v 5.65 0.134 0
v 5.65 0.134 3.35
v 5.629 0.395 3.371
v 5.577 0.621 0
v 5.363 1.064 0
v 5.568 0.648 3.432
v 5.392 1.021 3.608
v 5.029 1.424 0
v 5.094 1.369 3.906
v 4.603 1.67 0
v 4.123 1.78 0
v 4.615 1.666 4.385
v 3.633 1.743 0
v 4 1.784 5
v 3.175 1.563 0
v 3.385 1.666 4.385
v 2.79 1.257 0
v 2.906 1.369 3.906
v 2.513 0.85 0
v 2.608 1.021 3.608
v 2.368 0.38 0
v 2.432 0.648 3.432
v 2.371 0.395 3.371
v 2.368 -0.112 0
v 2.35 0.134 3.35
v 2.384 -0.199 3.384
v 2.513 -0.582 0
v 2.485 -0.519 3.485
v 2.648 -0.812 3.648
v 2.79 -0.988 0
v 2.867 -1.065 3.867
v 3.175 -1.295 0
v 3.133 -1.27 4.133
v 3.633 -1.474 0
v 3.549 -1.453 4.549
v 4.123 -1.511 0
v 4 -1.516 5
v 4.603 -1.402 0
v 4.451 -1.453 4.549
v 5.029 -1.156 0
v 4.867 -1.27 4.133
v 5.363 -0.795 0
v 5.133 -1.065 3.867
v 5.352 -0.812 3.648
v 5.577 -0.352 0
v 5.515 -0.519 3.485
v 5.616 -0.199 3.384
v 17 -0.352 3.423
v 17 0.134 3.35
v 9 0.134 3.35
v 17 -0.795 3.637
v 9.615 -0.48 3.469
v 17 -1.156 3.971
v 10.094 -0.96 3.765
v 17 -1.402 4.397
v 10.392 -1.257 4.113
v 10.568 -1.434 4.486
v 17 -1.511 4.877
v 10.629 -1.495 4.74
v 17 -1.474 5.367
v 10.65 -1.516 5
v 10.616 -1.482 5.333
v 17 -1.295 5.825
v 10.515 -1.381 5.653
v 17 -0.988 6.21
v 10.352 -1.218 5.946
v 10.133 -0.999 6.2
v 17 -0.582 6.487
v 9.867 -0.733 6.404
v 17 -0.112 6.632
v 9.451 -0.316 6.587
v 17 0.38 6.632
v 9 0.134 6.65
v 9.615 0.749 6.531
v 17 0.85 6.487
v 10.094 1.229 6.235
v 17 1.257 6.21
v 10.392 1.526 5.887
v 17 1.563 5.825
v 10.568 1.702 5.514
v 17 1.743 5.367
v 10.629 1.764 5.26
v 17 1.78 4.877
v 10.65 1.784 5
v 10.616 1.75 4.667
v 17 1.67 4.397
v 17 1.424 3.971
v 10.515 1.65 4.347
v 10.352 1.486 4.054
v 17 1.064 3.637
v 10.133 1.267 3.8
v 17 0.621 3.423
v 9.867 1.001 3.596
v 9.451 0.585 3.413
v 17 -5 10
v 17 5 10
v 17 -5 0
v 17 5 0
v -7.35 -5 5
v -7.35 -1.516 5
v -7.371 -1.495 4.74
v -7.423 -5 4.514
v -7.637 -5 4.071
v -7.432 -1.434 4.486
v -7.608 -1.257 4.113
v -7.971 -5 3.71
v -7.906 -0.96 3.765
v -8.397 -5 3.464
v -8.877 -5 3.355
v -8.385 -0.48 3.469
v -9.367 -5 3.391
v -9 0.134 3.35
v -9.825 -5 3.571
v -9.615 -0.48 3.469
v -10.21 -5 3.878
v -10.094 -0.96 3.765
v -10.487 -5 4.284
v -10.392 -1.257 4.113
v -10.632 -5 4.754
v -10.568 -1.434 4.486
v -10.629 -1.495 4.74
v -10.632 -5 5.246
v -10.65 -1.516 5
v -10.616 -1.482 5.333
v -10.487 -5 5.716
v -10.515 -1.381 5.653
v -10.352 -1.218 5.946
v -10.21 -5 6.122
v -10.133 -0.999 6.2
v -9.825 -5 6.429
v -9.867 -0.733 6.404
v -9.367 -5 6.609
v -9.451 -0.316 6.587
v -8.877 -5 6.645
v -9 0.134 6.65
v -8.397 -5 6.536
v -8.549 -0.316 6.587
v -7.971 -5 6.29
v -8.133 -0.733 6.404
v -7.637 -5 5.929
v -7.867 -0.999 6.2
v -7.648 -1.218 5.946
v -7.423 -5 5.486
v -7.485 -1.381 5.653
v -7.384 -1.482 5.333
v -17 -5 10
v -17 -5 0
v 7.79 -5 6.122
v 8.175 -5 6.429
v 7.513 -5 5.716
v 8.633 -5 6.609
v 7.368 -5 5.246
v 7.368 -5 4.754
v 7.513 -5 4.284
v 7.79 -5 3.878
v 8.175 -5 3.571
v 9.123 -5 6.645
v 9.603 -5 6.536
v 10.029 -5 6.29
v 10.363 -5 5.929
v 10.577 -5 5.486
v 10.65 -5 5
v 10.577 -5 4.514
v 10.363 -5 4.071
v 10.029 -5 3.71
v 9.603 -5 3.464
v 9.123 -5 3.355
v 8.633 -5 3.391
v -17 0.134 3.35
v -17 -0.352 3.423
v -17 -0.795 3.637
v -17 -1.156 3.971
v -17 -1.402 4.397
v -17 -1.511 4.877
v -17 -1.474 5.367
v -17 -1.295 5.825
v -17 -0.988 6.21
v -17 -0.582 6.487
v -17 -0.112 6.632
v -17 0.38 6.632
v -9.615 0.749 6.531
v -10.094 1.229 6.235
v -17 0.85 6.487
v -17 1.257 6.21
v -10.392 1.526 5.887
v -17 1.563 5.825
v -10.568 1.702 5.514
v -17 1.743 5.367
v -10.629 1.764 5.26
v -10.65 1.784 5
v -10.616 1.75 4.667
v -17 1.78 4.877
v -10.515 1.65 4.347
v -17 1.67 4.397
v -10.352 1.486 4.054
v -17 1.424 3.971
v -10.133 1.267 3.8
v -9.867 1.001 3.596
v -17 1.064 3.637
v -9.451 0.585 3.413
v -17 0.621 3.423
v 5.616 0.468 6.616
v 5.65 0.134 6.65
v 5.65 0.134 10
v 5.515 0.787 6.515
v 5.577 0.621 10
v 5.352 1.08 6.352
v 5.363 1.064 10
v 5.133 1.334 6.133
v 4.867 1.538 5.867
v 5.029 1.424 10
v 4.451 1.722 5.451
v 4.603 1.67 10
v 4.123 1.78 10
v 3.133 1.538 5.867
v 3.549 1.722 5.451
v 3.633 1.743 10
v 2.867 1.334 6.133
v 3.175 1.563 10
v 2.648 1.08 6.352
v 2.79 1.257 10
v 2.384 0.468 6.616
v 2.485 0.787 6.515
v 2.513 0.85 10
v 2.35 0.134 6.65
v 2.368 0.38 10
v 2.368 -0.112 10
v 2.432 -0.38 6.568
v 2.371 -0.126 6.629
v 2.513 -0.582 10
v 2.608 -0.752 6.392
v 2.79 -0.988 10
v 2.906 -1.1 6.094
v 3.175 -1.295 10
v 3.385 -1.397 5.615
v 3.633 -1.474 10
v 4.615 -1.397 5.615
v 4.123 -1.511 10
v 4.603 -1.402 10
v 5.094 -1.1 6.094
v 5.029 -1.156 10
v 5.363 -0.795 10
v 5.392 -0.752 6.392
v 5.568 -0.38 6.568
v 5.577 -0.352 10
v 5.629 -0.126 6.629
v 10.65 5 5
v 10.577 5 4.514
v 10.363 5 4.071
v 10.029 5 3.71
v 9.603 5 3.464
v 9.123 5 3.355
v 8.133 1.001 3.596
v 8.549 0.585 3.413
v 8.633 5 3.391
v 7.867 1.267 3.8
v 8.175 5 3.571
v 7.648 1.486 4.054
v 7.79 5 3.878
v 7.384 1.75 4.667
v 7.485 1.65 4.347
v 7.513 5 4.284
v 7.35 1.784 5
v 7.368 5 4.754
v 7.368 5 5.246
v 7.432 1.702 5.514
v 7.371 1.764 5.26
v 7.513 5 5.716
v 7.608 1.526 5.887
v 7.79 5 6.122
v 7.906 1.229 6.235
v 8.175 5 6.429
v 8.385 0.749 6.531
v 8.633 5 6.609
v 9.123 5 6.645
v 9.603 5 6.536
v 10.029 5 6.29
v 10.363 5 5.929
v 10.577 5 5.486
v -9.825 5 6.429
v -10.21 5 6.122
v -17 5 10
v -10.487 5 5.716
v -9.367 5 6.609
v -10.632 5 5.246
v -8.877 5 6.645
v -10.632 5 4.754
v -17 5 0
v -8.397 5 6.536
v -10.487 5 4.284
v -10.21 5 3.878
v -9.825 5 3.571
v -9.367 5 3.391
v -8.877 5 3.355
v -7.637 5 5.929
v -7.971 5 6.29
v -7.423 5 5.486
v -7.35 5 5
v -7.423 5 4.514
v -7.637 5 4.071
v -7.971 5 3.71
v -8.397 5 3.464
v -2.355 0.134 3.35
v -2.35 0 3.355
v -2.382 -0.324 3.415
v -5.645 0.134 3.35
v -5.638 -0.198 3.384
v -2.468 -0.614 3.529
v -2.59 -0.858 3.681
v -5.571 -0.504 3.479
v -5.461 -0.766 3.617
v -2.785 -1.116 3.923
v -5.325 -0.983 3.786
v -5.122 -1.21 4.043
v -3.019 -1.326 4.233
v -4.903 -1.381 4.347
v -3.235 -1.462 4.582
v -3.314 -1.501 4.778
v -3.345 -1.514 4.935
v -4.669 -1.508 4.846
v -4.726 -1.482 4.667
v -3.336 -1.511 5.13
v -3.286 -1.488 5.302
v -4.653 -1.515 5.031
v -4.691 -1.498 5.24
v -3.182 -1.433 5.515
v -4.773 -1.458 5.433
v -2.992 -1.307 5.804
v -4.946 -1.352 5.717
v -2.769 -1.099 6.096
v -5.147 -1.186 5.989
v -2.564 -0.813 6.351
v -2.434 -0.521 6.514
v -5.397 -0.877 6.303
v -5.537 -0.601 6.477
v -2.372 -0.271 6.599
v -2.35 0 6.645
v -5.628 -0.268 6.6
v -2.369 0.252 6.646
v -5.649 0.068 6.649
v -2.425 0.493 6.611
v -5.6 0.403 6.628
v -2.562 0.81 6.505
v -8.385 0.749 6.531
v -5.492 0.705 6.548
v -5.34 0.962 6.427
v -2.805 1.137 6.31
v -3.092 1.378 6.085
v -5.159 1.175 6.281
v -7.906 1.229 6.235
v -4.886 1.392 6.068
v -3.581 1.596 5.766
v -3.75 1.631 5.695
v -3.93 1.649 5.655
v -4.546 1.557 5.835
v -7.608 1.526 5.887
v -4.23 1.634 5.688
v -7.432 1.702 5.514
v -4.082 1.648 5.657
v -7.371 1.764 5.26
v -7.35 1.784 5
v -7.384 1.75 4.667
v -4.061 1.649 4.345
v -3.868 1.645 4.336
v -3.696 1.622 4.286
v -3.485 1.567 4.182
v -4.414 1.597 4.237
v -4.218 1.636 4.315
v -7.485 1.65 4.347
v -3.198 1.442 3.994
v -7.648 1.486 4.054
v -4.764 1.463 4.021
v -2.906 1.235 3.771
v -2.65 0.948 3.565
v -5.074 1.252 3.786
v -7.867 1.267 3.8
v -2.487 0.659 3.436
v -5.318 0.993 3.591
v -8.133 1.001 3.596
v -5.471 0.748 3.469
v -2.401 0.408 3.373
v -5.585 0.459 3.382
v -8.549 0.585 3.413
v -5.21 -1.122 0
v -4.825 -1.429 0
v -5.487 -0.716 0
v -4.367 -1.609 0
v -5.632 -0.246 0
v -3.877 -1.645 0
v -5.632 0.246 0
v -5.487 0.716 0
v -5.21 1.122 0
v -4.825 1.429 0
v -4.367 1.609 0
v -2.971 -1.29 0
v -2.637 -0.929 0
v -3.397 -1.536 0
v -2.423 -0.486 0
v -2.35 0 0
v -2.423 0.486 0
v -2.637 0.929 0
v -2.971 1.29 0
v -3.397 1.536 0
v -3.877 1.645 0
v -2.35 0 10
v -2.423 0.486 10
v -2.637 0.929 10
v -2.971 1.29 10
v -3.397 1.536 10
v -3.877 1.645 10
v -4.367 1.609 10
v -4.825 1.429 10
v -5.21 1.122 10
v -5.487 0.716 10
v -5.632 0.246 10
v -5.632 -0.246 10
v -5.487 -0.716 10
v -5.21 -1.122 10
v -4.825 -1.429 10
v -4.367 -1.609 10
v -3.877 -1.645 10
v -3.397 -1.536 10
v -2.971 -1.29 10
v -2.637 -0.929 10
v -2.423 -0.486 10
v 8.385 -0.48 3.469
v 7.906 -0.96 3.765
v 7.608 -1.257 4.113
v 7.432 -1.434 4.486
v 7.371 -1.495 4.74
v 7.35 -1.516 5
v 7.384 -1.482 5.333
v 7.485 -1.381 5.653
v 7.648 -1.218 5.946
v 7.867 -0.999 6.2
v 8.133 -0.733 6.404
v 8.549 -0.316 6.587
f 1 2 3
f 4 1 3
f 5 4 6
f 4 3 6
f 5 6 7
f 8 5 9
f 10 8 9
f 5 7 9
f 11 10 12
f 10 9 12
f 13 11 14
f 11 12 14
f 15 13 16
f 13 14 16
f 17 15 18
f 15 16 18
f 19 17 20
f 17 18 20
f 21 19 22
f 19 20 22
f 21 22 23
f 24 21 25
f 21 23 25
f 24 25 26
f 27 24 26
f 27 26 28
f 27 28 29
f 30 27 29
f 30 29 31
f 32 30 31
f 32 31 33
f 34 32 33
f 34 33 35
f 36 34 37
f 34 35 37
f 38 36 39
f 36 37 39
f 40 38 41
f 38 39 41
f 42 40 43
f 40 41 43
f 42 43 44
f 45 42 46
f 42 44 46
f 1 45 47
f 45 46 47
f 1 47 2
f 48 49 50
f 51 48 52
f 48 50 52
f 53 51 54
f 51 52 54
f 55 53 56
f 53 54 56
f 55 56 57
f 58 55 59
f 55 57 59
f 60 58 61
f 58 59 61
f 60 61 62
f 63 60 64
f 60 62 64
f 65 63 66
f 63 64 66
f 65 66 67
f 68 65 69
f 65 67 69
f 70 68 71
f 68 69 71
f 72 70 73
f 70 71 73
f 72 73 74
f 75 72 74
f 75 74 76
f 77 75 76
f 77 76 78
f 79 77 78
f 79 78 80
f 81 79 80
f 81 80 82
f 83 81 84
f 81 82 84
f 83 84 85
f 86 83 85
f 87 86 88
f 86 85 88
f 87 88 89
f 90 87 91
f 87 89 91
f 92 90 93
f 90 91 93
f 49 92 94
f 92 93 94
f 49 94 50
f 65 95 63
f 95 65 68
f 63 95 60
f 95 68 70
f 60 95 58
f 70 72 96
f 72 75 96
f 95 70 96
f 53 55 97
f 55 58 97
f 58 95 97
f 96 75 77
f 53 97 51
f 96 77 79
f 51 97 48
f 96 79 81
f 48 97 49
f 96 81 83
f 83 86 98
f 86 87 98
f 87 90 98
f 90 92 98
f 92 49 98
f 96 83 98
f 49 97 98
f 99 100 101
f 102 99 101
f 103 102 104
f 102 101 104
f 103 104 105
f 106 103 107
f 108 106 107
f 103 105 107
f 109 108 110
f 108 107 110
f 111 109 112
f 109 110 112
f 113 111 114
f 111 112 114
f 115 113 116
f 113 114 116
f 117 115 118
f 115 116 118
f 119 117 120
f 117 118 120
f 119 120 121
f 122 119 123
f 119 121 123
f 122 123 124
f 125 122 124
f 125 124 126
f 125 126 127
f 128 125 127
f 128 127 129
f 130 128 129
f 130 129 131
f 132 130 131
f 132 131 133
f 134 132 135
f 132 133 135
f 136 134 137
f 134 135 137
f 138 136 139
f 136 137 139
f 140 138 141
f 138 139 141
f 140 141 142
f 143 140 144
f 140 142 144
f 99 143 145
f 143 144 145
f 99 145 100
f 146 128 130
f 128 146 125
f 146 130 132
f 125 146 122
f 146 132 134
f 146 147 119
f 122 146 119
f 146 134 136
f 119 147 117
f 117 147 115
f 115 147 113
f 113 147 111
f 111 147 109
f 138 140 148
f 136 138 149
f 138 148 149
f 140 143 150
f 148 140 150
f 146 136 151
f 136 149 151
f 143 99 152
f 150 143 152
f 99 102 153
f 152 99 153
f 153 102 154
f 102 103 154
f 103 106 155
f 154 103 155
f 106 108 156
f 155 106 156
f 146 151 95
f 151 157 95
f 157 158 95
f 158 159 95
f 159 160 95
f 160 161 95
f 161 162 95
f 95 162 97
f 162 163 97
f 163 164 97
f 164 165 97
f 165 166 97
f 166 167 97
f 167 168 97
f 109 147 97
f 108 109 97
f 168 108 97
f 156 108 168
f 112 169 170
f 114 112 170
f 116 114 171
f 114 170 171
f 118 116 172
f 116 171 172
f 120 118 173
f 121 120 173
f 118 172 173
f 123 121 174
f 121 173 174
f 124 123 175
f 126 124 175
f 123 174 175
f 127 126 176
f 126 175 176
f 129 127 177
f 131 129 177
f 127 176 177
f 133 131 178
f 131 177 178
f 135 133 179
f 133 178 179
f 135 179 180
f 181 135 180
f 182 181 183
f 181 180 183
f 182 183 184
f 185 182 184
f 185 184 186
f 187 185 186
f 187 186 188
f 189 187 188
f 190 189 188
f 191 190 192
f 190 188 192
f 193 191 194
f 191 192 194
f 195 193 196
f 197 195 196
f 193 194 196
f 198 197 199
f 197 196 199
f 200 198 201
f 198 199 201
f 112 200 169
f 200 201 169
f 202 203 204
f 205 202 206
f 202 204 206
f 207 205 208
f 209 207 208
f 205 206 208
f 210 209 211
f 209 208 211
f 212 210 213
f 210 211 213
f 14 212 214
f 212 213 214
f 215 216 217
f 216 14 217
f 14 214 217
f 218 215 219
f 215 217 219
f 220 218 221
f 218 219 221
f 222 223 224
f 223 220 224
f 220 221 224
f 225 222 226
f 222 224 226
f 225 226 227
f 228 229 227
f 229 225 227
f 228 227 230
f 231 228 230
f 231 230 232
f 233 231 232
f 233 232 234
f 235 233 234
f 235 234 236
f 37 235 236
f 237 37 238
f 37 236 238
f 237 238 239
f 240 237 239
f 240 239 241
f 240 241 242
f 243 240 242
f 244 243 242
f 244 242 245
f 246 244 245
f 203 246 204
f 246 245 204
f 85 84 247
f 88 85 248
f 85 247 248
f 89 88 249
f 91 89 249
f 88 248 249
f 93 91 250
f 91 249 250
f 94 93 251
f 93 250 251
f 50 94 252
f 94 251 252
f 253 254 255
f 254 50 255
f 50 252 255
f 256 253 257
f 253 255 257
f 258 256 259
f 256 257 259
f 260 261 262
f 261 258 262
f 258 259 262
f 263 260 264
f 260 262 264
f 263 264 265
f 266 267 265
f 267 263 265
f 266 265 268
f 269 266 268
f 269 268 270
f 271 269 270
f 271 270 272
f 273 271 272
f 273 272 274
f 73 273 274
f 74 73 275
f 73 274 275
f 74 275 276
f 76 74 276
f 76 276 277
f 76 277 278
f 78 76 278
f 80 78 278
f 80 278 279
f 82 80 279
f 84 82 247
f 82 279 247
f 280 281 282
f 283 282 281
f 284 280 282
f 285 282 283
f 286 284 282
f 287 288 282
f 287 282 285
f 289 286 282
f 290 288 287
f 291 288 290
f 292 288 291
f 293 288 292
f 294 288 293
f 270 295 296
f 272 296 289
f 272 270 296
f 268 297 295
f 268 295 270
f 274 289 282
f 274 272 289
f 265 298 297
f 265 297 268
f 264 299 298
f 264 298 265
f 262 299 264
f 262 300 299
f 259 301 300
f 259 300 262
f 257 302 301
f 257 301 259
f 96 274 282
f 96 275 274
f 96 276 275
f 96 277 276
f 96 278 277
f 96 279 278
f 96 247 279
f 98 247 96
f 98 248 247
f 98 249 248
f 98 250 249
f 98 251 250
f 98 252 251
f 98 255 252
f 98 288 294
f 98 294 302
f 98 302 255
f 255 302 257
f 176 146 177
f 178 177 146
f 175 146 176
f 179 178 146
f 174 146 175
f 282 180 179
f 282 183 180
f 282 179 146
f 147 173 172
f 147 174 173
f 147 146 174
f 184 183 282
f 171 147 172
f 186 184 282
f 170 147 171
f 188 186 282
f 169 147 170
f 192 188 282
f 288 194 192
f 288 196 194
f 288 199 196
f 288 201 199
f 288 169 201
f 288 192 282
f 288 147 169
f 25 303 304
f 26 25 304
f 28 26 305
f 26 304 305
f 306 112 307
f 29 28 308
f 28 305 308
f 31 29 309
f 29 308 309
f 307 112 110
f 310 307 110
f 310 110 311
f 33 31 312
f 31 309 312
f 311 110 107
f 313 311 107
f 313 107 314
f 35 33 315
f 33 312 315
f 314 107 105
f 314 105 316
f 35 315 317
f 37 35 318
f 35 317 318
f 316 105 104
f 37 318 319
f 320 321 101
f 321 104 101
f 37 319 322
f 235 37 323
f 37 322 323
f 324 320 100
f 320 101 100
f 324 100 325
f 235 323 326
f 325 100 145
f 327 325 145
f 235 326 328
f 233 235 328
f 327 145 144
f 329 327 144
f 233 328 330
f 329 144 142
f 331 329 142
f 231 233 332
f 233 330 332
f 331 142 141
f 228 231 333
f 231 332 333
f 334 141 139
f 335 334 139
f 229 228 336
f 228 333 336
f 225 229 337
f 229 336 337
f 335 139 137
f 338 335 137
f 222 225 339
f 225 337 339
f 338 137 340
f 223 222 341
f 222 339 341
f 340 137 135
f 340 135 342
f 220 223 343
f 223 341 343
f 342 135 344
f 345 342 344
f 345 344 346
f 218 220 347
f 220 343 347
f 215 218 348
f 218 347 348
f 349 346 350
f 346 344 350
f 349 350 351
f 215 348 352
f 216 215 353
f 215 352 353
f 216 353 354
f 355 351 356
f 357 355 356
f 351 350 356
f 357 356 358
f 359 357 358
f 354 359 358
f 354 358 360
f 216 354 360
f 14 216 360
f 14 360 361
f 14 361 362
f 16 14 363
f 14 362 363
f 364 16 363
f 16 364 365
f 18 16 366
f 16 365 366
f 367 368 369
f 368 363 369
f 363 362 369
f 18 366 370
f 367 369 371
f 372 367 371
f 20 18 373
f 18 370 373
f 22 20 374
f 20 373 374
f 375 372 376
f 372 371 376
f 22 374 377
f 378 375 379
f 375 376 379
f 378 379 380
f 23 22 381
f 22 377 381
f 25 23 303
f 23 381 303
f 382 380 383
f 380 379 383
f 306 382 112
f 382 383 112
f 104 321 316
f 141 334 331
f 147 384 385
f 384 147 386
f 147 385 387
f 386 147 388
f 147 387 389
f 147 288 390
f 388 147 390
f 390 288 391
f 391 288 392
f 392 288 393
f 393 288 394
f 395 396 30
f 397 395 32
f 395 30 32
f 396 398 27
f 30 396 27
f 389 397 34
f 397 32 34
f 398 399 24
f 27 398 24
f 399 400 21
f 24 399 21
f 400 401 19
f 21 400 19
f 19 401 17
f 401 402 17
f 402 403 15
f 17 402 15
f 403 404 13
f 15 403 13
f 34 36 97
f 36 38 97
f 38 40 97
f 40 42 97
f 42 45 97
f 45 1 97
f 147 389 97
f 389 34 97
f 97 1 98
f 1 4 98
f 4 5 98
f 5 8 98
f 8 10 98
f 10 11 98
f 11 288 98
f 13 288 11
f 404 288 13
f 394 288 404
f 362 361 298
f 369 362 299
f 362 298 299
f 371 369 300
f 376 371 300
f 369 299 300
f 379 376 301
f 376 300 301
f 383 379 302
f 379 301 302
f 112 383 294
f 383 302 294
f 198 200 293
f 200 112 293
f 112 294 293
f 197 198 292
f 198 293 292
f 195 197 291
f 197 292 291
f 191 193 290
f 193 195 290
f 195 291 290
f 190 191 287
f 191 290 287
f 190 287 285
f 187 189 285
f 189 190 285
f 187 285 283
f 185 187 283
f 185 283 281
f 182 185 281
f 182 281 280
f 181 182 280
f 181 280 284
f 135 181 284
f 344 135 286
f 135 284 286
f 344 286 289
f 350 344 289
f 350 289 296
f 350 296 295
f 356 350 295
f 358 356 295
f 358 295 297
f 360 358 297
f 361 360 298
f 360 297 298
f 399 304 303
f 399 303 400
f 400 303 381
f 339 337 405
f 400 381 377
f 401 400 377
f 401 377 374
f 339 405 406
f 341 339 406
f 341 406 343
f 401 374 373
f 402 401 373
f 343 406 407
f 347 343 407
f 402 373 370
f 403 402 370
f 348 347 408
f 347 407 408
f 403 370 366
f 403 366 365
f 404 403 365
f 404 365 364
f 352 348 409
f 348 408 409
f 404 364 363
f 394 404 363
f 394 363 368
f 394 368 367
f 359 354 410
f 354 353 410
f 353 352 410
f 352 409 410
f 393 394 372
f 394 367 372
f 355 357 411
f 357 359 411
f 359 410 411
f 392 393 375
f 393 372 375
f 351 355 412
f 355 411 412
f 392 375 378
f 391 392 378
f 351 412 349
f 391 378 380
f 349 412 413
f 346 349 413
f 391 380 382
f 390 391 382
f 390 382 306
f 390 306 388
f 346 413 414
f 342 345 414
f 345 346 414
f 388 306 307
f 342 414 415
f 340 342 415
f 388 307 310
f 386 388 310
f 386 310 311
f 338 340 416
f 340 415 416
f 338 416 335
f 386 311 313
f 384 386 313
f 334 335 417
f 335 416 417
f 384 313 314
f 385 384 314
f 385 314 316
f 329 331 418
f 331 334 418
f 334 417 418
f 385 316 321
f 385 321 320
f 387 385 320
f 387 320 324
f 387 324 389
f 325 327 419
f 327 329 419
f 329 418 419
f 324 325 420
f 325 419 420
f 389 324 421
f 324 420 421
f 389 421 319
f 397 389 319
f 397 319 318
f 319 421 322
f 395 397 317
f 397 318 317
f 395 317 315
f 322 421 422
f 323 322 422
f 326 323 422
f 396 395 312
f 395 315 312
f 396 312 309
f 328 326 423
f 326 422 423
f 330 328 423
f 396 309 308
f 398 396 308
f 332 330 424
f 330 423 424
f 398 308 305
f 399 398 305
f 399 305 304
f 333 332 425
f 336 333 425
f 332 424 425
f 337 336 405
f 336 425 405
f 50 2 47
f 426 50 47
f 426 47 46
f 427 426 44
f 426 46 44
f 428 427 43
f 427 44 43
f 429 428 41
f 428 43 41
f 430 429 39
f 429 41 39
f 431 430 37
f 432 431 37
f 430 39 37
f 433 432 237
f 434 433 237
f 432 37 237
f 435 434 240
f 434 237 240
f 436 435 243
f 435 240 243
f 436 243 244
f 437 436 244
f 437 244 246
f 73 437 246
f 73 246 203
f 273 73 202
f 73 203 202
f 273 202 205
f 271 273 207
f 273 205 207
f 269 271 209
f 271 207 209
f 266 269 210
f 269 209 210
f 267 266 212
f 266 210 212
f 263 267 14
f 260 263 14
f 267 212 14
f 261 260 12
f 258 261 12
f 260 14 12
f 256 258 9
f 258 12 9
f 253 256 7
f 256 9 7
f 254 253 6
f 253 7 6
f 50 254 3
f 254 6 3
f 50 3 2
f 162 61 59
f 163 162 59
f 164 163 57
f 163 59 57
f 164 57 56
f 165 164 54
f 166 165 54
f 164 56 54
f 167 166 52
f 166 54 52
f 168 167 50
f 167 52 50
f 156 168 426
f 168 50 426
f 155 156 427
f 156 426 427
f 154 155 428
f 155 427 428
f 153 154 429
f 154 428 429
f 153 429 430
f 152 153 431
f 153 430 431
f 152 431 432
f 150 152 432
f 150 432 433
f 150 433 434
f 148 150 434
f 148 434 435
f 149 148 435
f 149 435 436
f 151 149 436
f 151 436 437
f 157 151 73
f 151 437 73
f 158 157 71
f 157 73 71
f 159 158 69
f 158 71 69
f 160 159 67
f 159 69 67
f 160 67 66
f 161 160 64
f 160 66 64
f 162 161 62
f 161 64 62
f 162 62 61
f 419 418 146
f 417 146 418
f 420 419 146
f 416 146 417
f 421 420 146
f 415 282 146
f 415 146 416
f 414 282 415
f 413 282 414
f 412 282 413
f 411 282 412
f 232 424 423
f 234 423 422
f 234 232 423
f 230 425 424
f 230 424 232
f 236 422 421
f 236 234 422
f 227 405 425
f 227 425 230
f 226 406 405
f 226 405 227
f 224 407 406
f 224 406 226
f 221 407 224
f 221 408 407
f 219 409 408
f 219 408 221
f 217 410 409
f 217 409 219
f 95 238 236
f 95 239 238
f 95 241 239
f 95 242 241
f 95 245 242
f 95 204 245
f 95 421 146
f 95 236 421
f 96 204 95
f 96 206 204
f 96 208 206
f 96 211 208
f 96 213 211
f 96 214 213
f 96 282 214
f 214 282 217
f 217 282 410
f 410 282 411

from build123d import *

# Parameters (mm, degrees)
SKETCH_3_W         = 34
SKETCH_3_H         = 10
EXTRUDE_2_DEPTH    = 10
HOLE_WIZARD_M4_1_D = 3.3
HOLE_WIZARD_M4_2_D = 3.3
HOLE_WIZARD_M4_3_D = 3.3
HOLE_WIZARD_M4_4_D = 3.3
HOLE_WIZARD_M4_5_D = 3.3


with BuildPart() as part:
    # 草图3 → 凸台-拉伸2 (new body)
    with BuildSketch(Plane.XY):
        Rectangle(SKETCH_3_W, SKETCH_3_H)
    extrude(amount=EXTRUDE_2_DEPTH)

    # M4 螺纹孔的螺纹孔钻头1 (through all)
    with Locations(Plane(origin=(17, 0.134296894, 5), x_dir=(0, 0, 1), z_dir=(1, 0, 0))):
        with Locations((0, 0)):
            Hole(HOLE_WIZARD_M4_1_D / 2)

    # M4 螺纹孔的螺纹孔钻头2 (through all)
    with Locations(Plane(origin=(9, -5, 5), x_dir=(-1, 0, 0), z_dir=(0, -1, 0))):
        with Locations((0, 0)):
            Hole(HOLE_WIZARD_M4_2_D / 2)

    # M4 螺纹孔的螺纹孔钻头3 (through all)
    with Locations(Plane(origin=(-9, -5, 5), x_dir=(-1, 0, 0), z_dir=(0, -1, 0))):
        with Locations((0, 0)):
            Hole(HOLE_WIZARD_M4_3_D / 2)

    # M4 螺纹孔的螺纹孔钻头4 (through all)
    with Locations(Plane(origin=(4, 0.134296894, 0), x_dir=(-1, 0, 0), z_dir=(0, 0, -1))):
        with Locations((0, 0)):
            Hole(HOLE_WIZARD_M4_4_D / 2)

    # M4 螺纹孔的螺纹孔钻头5 (through all)
    with Locations(Plane(origin=(-4, 0, 0), x_dir=(-1, 0, 0), z_dir=(0, 0, -1))):
        with Locations((0, 0)):
            Hole(HOLE_WIZARD_M4_5_D / 2)


solid = part.part
